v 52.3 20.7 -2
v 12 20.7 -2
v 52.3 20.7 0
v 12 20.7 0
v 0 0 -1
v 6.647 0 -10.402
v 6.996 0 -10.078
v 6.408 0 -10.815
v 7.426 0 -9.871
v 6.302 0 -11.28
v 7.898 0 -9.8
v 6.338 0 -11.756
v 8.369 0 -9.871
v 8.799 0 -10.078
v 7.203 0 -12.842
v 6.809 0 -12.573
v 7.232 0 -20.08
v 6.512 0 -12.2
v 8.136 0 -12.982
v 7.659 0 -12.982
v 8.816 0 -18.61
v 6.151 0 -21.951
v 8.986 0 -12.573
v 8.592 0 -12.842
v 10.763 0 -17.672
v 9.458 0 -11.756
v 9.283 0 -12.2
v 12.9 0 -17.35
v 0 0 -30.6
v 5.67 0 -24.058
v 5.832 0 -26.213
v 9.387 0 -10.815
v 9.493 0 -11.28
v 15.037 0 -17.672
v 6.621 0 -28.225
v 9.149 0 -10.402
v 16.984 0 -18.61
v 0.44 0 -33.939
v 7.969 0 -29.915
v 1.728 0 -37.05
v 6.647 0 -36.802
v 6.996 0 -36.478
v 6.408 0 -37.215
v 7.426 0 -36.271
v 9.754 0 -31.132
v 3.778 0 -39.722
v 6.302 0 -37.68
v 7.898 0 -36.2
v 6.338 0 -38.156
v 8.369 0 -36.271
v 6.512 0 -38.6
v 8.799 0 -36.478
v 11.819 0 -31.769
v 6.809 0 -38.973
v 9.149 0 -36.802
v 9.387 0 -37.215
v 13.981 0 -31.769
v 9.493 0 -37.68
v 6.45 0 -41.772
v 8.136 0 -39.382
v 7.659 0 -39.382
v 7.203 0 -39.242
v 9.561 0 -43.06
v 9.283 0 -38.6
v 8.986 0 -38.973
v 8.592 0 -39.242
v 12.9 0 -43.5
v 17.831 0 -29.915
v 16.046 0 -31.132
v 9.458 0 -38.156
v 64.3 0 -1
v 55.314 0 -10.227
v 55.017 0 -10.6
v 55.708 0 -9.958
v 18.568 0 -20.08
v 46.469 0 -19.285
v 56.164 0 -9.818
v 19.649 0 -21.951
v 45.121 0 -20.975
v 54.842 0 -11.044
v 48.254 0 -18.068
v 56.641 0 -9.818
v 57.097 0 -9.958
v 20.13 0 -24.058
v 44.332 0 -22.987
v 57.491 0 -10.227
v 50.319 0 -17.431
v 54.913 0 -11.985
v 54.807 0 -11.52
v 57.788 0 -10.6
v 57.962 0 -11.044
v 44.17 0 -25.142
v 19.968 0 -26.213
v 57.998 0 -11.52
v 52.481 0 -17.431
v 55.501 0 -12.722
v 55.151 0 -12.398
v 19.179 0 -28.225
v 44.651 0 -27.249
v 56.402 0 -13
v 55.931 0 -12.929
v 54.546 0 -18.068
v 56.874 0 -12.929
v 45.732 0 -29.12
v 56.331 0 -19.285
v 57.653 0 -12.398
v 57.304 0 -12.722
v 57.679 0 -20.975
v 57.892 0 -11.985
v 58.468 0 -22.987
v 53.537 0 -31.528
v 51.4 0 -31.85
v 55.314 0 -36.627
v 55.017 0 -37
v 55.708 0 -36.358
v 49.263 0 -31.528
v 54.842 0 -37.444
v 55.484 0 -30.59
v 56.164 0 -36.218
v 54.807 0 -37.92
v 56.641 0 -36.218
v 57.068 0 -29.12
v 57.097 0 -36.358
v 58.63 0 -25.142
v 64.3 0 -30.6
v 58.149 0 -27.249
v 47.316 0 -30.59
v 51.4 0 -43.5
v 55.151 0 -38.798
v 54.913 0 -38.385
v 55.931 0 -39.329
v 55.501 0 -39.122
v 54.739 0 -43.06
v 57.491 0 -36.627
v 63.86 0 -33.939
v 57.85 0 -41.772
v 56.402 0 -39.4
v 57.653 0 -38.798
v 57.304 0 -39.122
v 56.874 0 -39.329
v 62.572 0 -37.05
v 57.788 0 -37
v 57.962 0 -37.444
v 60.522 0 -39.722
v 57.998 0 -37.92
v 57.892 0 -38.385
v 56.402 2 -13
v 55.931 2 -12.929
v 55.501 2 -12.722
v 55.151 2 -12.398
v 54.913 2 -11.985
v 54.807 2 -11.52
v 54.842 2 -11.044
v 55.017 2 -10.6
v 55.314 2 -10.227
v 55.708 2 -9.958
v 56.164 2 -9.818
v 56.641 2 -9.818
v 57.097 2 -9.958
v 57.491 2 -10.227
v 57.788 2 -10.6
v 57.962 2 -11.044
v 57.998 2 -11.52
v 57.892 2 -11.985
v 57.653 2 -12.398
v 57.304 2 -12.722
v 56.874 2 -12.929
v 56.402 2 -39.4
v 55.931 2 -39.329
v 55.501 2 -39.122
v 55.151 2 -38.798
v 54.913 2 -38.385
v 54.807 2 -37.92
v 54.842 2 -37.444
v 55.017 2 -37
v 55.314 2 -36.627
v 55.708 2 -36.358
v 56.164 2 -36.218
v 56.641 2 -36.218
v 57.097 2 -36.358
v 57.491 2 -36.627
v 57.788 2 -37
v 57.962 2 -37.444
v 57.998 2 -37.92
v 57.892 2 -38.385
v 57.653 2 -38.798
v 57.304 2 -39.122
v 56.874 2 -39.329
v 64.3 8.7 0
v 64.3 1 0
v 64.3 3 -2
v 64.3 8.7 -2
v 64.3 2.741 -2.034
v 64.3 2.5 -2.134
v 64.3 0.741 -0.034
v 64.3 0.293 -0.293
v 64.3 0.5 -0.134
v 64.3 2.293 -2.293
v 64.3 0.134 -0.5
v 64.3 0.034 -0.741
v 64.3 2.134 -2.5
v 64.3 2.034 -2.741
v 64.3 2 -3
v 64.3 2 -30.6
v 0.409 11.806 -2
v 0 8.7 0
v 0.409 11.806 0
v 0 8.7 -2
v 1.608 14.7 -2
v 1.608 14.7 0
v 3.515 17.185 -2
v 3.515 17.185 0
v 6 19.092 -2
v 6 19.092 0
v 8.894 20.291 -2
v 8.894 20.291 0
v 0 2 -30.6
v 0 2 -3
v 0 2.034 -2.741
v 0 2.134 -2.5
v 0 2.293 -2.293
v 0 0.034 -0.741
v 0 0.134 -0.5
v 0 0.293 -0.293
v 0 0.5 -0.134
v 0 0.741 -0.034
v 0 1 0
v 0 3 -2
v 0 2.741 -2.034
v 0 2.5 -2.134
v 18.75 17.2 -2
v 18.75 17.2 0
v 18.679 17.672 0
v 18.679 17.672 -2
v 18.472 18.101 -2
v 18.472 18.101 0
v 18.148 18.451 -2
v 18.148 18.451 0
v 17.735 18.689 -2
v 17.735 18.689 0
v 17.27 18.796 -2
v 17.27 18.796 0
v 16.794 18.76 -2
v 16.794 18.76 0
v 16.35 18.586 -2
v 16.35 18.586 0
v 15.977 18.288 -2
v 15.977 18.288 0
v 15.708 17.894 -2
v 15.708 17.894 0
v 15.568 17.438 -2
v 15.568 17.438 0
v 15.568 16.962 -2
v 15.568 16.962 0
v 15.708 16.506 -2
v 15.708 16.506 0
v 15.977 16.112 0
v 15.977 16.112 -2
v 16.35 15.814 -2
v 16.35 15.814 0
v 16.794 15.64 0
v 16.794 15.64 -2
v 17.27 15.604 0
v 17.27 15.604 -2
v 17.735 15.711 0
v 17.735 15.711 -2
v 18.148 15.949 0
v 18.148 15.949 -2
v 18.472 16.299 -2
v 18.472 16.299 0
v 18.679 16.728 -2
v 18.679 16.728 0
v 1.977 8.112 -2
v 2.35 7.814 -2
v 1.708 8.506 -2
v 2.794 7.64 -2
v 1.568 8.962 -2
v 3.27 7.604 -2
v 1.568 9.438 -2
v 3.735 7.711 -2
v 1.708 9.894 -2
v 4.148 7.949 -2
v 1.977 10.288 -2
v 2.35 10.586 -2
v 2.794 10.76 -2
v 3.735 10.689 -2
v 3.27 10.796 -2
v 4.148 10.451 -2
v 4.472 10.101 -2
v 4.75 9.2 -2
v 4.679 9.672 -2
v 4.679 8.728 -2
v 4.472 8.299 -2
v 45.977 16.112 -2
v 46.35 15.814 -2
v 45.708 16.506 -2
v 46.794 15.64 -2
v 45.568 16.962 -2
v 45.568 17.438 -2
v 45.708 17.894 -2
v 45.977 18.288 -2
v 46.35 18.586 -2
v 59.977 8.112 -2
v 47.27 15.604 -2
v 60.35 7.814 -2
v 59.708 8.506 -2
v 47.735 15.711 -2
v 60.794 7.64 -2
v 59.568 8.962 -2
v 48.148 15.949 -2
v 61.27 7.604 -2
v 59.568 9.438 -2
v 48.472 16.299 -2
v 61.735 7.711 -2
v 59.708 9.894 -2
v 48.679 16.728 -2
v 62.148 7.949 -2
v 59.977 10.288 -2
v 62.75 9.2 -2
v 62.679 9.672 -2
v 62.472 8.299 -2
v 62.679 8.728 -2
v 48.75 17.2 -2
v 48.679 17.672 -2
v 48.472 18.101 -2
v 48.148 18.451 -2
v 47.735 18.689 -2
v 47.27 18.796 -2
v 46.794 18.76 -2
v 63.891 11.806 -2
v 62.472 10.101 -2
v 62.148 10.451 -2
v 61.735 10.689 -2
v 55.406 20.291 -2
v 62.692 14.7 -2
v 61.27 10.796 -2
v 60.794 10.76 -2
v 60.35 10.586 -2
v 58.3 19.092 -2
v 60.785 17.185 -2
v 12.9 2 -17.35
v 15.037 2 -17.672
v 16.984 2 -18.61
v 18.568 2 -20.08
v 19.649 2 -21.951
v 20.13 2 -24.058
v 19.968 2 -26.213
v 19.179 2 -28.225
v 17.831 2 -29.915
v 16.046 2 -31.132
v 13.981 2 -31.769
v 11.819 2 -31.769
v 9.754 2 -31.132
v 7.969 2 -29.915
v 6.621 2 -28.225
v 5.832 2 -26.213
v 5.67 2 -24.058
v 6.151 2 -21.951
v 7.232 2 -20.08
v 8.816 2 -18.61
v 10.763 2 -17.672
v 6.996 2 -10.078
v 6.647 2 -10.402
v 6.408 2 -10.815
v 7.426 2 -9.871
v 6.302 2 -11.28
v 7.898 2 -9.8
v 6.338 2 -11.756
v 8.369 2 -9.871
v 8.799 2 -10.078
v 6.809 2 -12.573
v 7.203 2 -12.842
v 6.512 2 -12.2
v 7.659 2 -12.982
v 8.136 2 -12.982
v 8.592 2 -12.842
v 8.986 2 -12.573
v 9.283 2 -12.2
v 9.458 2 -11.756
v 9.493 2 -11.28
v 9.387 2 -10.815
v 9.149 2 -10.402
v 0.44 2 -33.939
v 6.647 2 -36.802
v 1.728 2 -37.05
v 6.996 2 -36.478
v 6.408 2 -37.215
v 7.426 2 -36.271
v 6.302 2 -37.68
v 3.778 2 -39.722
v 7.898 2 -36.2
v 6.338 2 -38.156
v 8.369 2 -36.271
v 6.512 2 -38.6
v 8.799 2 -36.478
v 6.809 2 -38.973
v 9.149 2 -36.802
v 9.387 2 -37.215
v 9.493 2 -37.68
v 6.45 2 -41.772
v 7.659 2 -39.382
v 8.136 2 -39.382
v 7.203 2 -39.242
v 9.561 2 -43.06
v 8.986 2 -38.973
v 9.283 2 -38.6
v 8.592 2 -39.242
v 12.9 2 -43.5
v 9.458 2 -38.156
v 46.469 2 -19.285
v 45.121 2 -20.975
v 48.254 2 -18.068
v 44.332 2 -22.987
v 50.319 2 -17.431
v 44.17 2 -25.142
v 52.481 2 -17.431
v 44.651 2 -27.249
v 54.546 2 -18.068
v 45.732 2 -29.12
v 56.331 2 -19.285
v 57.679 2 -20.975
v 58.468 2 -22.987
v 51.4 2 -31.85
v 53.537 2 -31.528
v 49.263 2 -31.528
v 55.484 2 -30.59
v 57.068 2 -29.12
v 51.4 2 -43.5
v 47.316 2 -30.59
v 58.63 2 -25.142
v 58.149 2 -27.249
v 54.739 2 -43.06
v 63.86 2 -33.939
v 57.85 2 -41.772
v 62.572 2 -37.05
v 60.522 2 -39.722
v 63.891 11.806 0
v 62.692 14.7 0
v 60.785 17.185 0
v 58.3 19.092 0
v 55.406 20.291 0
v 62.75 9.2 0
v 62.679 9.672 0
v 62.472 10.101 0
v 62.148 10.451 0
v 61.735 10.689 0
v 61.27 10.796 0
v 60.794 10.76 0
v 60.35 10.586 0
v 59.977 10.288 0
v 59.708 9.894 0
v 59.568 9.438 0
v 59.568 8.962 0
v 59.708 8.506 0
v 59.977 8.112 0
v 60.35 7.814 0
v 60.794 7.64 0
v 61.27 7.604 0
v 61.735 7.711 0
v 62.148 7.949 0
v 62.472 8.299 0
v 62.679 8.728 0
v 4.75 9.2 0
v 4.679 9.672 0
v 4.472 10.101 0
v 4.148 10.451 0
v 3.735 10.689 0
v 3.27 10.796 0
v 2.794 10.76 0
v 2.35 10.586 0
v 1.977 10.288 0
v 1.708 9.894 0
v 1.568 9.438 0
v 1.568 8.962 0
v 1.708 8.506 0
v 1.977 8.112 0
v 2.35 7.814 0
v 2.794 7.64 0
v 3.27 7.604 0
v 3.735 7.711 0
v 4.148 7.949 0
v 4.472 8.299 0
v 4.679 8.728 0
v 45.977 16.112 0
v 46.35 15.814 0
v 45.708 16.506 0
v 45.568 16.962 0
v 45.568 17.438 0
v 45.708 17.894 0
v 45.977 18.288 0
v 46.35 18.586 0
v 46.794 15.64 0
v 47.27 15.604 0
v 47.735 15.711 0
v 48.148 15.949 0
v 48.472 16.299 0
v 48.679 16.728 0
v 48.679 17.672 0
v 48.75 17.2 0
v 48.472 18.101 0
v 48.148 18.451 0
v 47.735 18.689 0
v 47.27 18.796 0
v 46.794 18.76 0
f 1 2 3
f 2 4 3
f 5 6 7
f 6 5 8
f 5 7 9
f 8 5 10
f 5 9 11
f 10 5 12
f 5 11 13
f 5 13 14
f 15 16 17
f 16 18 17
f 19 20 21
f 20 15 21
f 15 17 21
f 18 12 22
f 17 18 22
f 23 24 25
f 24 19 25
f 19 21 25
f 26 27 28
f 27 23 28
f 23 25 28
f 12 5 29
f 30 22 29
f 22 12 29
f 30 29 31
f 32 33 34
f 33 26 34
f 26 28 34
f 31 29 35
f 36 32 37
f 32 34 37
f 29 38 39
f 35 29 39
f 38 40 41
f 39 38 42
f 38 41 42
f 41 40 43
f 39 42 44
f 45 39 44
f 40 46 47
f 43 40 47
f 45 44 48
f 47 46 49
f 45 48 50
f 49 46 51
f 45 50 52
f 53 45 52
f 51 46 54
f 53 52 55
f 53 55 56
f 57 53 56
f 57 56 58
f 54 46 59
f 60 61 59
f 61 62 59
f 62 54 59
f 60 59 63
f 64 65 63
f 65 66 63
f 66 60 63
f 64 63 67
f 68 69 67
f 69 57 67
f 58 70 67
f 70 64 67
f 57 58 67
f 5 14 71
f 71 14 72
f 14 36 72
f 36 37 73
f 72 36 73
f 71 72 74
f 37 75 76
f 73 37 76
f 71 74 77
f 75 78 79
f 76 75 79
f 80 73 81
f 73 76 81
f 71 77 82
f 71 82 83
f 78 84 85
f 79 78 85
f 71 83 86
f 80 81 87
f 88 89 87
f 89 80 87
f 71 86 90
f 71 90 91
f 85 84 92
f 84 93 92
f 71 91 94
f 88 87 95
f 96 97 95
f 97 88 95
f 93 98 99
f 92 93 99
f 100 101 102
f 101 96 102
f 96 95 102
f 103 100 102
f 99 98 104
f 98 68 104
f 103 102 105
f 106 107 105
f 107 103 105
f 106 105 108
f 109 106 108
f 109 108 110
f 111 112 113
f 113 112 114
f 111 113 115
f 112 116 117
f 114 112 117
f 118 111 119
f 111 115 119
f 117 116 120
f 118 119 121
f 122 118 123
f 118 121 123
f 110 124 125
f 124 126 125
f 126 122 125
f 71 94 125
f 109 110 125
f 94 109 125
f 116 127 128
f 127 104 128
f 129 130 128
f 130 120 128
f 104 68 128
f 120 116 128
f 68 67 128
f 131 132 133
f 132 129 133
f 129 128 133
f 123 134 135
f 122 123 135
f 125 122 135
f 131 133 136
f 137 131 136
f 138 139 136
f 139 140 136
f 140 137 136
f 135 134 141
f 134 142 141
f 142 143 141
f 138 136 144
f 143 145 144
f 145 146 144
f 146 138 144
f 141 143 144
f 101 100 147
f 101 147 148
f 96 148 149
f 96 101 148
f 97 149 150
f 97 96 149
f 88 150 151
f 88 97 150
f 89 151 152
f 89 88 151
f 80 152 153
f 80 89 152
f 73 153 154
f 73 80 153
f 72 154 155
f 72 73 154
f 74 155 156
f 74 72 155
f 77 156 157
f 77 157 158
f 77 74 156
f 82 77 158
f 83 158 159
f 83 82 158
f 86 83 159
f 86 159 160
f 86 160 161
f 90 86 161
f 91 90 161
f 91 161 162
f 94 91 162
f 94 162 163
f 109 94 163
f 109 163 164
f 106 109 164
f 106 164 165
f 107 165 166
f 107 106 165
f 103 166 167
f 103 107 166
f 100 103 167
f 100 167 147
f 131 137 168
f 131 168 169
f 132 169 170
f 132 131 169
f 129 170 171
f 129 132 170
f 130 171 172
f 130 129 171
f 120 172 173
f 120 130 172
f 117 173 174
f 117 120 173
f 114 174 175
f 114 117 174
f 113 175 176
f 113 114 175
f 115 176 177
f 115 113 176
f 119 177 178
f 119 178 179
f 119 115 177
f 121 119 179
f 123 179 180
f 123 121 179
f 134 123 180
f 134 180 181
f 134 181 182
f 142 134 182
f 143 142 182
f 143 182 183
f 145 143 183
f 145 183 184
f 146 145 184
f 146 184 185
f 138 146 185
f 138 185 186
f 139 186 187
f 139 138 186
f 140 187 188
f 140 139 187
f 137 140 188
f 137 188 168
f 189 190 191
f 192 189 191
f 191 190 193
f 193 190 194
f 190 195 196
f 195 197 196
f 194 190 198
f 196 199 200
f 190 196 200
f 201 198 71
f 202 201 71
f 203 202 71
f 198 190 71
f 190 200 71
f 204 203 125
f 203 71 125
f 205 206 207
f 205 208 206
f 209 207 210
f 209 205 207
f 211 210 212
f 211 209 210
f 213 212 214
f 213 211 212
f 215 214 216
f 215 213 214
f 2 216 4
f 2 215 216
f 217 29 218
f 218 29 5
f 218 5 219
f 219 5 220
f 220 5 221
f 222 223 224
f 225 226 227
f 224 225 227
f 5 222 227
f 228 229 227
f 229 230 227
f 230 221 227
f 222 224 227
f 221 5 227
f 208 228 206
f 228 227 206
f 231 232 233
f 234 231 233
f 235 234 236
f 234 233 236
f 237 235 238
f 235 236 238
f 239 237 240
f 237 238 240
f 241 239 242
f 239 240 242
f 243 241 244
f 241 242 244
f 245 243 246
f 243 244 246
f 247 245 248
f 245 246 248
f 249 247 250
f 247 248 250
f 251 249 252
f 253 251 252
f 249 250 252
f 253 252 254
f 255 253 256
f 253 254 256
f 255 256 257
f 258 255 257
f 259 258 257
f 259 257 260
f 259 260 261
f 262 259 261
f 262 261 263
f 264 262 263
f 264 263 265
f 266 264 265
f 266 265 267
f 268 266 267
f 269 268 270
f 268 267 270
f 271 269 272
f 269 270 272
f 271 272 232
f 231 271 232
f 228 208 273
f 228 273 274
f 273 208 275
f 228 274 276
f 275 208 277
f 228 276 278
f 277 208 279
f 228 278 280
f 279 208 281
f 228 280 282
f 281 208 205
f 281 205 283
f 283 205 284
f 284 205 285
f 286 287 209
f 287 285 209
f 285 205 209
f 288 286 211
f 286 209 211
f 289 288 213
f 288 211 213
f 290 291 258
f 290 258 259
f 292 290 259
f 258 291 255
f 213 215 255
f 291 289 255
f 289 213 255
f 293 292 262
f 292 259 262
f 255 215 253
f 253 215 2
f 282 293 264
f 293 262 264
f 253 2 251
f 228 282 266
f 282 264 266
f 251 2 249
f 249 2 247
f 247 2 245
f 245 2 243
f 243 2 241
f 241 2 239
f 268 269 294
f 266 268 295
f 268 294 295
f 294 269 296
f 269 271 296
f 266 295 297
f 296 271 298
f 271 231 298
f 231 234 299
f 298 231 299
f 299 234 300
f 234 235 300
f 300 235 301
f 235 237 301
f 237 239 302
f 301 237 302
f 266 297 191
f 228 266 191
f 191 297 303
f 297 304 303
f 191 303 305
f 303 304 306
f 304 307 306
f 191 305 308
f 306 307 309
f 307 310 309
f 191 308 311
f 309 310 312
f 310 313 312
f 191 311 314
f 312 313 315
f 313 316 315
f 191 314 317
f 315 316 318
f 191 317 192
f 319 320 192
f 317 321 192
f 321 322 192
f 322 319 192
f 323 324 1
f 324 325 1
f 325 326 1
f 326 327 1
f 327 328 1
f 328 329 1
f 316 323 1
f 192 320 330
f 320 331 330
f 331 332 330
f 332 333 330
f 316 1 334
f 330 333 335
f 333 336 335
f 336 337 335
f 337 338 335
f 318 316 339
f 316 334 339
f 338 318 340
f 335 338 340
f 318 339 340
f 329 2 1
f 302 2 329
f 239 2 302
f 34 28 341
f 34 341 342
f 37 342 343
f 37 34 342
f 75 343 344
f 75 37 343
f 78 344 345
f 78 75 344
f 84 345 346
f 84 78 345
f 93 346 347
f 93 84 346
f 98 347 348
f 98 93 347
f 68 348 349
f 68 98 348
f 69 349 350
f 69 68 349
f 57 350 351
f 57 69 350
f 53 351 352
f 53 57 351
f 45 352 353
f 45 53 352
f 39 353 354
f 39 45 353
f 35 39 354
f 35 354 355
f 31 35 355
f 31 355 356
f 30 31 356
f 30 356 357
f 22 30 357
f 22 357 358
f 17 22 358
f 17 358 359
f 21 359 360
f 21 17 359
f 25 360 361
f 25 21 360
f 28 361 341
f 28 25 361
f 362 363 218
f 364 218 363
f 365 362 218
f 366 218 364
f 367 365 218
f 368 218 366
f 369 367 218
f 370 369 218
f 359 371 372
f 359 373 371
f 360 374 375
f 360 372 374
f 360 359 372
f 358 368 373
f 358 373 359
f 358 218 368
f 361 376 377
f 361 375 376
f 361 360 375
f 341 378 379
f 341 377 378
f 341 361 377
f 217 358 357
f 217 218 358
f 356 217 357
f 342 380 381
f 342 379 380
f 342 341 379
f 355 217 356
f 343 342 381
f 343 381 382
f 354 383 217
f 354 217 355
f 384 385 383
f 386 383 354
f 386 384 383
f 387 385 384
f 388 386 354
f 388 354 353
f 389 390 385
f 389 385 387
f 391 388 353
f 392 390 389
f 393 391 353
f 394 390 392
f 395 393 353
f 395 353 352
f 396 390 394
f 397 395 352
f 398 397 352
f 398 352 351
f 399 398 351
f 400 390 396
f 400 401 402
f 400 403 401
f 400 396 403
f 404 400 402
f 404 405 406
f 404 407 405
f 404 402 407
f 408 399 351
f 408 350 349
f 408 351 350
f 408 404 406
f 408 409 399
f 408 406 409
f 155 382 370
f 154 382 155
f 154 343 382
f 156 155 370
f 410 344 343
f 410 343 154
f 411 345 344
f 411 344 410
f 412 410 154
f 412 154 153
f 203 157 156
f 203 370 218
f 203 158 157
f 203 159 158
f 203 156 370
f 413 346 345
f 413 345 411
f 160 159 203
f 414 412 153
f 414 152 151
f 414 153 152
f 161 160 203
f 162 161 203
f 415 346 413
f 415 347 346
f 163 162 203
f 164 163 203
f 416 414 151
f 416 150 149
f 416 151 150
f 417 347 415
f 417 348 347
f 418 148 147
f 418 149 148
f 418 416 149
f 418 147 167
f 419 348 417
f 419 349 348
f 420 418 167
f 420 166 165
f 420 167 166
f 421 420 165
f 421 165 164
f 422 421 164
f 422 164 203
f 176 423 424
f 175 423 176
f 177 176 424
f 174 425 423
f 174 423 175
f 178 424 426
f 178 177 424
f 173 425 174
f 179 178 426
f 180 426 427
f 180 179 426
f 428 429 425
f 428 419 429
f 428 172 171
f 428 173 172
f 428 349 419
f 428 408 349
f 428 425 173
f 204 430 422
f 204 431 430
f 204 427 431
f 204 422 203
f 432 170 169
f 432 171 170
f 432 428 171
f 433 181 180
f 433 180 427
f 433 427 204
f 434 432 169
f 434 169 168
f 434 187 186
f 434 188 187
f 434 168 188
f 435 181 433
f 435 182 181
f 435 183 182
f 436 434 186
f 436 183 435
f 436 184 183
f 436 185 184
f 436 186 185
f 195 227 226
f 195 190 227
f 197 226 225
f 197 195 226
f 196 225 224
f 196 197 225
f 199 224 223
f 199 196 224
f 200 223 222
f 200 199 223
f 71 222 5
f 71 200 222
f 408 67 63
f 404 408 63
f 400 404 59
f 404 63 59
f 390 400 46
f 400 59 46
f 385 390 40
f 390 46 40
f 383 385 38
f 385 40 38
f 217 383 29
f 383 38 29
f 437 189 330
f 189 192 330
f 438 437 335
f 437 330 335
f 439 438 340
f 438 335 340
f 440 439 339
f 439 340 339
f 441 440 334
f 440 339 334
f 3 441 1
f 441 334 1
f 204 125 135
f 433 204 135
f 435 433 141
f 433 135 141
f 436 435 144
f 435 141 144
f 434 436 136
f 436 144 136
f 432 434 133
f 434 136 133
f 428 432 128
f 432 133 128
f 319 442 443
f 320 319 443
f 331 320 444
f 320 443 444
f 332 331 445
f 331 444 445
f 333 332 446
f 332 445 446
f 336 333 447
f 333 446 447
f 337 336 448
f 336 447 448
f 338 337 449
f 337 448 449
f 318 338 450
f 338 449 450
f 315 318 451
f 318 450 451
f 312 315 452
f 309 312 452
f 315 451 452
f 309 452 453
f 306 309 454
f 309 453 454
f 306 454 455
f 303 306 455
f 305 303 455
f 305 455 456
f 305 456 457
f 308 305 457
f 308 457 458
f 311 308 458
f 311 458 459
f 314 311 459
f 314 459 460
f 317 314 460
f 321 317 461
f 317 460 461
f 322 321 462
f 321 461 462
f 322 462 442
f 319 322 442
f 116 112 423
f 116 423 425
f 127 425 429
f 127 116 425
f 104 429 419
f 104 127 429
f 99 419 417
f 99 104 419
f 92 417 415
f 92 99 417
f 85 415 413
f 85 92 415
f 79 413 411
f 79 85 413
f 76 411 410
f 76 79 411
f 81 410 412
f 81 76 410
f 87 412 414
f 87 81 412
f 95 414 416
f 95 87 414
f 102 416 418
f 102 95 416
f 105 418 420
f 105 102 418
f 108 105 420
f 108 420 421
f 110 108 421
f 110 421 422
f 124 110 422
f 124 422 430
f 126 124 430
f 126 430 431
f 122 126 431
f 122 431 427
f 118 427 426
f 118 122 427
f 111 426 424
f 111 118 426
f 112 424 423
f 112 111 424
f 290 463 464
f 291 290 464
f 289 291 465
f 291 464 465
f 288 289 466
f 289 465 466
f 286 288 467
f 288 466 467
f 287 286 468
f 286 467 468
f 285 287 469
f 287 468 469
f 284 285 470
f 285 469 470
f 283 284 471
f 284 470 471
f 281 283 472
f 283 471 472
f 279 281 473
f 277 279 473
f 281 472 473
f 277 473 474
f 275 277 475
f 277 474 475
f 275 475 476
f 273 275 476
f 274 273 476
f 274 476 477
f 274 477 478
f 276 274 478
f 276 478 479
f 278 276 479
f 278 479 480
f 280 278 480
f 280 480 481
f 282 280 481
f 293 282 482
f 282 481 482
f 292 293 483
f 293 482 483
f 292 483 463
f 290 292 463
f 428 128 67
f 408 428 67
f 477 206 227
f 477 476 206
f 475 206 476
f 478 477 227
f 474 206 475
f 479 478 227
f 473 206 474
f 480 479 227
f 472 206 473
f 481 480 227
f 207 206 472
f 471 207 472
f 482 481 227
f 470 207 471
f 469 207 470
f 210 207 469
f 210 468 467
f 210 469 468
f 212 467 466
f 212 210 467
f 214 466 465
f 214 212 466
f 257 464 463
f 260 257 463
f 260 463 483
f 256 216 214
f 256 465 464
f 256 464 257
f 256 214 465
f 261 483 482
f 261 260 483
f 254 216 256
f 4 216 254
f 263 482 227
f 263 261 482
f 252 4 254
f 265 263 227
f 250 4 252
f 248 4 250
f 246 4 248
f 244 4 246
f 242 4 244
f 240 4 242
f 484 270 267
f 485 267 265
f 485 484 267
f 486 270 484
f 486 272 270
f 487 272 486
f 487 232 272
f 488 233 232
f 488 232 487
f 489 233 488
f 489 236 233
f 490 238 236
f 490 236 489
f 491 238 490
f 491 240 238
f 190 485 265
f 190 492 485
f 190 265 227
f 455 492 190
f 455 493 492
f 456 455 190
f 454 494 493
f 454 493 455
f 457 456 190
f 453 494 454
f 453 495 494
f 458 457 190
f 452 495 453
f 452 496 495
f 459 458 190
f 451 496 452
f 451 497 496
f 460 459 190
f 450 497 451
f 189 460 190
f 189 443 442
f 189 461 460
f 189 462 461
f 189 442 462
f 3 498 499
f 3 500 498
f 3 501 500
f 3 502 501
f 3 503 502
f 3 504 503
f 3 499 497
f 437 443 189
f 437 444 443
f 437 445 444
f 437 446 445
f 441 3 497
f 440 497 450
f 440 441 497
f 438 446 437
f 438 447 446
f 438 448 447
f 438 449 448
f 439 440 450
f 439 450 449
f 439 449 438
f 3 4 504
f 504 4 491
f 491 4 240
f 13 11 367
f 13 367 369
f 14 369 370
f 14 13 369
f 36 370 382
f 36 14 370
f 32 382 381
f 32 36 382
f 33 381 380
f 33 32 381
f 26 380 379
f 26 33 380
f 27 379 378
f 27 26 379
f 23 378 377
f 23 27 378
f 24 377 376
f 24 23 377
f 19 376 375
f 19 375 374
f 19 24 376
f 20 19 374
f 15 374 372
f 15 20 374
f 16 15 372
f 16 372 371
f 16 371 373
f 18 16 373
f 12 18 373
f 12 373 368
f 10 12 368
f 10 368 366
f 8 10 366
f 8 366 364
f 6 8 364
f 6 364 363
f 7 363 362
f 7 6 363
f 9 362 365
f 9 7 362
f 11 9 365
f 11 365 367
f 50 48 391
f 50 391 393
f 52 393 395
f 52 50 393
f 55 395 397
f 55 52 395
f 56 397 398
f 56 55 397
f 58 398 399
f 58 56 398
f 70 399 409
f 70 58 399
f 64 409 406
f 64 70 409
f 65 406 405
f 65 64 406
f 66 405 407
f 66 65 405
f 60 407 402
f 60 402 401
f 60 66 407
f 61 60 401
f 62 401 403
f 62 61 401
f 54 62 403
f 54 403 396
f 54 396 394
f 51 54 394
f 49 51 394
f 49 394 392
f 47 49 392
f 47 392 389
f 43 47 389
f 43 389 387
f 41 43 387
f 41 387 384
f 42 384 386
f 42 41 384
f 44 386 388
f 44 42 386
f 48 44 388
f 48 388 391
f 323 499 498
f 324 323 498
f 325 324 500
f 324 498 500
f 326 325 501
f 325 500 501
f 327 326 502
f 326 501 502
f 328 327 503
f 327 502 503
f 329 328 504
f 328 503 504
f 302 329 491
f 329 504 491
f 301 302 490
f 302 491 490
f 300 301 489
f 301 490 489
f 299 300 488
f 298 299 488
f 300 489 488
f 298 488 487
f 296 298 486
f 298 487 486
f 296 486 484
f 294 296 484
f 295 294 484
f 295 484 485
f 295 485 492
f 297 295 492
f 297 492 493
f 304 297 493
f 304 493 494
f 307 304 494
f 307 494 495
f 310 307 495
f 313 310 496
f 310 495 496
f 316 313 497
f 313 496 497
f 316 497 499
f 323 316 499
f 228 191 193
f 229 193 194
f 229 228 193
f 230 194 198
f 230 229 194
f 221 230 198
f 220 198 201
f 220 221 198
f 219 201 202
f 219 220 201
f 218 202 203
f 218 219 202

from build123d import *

# Parameters (mm, degrees)
SKETCH_1_R      = 1.6
SKETCH_1_R_2    = 7.25
EXTRUDE_1_DEPTH = 2
SKETCH_2_W      = 32.15
SKETCH_2_H      = 18.7
SKETCH_2_R      = 1.6
EXTRUDE_2_DEPTH = 2
FILLET_1_R      = 12
FILLET_2_R      = 1


with BuildPart() as part:
    # 草图1 → 凸台-拉伸1 (new body)
    with BuildSketch(Plane(origin=(0, 0, 0), x_dir=(1, 0, 0), z_dir=(0, 1, 0))):
        with BuildLine():
            Line((0, 0), (64.3, 0))
            Line((64.3, 0), (64.3, 30.6))
            ThreePointArc((64.3, 30.6), (60.521677477, 39.721677477), (51.4, 43.5))
            Line((51.4, 43.5), (12.9, 43.5))
            ThreePointArc((12.9, 43.5), (3.778322523, 39.721677477), (0, 30.6))
            Line((0, 30.6), (0, 0))
        make_face()
        with Locations(Location((7.89764523, 11.4, 0), (0, 0, 270))):
            Circle(SKETCH_1_R, mode=Mode.SUBTRACT)
        with Locations(Location((7.89764523, 37.8, 0), (0, 0, 270))):
            Circle(SKETCH_1_R, mode=Mode.SUBTRACT)
        with Locations(Location((12.9, 24.6, 0), (0, 0, 270))):
            Circle(SKETCH_1_R_2, mode=Mode.SUBTRACT)
        with Locations(Location((56.40235477, 11.4, 0), (0, 0, 90))):
            Circle(SKETCH_1_R, mode=Mode.SUBTRACT)
        with Locations(Location((56.40235477, 37.8, 0), (0, 0, 90))):
            Circle(SKETCH_1_R, mode=Mode.SUBTRACT)
        with Locations(Location((51.4, 24.6, 0), (0, 0, 90))):
            Circle(SKETCH_1_R_2, mode=Mode.SUBTRACT)
    extrude(amount=EXTRUDE_1_DEPTH)

    # 草图2 → 凸台-拉伸2 (add)
    # profile 1 of 2: a face of its own
    with BuildSketch(Plane.XY):
        with Locations((16.075, 11.35)):
            Rectangle(SKETCH_2_W, SKETCH_2_H)
        with Locations((3.15, 9.2)):
            Circle(SKETCH_2_R, mode=Mode.SUBTRACT)
        with Locations((17.15, 17.2)):
            Circle(SKETCH_2_R, mode=Mode.SUBTRACT)
    # profile 2 of 2: a face of its own
    with BuildSketch(Plane.XY):
        with Locations((48.225, 11.35)):
            Rectangle(SKETCH_2_W, SKETCH_2_H)
        with Locations((61.15, 9.2)):
            Circle(SKETCH_2_R, mode=Mode.SUBTRACT)
        with Locations((47.15, 17.2)):
            Circle(SKETCH_2_R, mode=Mode.SUBTRACT)
    extrude(amount=-EXTRUDE_2_DEPTH)

    # 圆角1
    fillet_1_edges = [part.edges().sort_by_distance(p)[0] for p in [
        (0, 20.7, -1),
        (64.3, 20.7, -1),
    ]]
    fillet(fillet_1_edges, radius=FILLET_1_R)

    # 圆角2
    fillet_2_edges = [part.edges().sort_by_distance(p)[0] for p in [
        (32.15, 2, -2),
        (32.15, 0, 0),
    ]]
    fillet(fillet_2_edges, radius=FILLET_2_R)


solid = part.part
